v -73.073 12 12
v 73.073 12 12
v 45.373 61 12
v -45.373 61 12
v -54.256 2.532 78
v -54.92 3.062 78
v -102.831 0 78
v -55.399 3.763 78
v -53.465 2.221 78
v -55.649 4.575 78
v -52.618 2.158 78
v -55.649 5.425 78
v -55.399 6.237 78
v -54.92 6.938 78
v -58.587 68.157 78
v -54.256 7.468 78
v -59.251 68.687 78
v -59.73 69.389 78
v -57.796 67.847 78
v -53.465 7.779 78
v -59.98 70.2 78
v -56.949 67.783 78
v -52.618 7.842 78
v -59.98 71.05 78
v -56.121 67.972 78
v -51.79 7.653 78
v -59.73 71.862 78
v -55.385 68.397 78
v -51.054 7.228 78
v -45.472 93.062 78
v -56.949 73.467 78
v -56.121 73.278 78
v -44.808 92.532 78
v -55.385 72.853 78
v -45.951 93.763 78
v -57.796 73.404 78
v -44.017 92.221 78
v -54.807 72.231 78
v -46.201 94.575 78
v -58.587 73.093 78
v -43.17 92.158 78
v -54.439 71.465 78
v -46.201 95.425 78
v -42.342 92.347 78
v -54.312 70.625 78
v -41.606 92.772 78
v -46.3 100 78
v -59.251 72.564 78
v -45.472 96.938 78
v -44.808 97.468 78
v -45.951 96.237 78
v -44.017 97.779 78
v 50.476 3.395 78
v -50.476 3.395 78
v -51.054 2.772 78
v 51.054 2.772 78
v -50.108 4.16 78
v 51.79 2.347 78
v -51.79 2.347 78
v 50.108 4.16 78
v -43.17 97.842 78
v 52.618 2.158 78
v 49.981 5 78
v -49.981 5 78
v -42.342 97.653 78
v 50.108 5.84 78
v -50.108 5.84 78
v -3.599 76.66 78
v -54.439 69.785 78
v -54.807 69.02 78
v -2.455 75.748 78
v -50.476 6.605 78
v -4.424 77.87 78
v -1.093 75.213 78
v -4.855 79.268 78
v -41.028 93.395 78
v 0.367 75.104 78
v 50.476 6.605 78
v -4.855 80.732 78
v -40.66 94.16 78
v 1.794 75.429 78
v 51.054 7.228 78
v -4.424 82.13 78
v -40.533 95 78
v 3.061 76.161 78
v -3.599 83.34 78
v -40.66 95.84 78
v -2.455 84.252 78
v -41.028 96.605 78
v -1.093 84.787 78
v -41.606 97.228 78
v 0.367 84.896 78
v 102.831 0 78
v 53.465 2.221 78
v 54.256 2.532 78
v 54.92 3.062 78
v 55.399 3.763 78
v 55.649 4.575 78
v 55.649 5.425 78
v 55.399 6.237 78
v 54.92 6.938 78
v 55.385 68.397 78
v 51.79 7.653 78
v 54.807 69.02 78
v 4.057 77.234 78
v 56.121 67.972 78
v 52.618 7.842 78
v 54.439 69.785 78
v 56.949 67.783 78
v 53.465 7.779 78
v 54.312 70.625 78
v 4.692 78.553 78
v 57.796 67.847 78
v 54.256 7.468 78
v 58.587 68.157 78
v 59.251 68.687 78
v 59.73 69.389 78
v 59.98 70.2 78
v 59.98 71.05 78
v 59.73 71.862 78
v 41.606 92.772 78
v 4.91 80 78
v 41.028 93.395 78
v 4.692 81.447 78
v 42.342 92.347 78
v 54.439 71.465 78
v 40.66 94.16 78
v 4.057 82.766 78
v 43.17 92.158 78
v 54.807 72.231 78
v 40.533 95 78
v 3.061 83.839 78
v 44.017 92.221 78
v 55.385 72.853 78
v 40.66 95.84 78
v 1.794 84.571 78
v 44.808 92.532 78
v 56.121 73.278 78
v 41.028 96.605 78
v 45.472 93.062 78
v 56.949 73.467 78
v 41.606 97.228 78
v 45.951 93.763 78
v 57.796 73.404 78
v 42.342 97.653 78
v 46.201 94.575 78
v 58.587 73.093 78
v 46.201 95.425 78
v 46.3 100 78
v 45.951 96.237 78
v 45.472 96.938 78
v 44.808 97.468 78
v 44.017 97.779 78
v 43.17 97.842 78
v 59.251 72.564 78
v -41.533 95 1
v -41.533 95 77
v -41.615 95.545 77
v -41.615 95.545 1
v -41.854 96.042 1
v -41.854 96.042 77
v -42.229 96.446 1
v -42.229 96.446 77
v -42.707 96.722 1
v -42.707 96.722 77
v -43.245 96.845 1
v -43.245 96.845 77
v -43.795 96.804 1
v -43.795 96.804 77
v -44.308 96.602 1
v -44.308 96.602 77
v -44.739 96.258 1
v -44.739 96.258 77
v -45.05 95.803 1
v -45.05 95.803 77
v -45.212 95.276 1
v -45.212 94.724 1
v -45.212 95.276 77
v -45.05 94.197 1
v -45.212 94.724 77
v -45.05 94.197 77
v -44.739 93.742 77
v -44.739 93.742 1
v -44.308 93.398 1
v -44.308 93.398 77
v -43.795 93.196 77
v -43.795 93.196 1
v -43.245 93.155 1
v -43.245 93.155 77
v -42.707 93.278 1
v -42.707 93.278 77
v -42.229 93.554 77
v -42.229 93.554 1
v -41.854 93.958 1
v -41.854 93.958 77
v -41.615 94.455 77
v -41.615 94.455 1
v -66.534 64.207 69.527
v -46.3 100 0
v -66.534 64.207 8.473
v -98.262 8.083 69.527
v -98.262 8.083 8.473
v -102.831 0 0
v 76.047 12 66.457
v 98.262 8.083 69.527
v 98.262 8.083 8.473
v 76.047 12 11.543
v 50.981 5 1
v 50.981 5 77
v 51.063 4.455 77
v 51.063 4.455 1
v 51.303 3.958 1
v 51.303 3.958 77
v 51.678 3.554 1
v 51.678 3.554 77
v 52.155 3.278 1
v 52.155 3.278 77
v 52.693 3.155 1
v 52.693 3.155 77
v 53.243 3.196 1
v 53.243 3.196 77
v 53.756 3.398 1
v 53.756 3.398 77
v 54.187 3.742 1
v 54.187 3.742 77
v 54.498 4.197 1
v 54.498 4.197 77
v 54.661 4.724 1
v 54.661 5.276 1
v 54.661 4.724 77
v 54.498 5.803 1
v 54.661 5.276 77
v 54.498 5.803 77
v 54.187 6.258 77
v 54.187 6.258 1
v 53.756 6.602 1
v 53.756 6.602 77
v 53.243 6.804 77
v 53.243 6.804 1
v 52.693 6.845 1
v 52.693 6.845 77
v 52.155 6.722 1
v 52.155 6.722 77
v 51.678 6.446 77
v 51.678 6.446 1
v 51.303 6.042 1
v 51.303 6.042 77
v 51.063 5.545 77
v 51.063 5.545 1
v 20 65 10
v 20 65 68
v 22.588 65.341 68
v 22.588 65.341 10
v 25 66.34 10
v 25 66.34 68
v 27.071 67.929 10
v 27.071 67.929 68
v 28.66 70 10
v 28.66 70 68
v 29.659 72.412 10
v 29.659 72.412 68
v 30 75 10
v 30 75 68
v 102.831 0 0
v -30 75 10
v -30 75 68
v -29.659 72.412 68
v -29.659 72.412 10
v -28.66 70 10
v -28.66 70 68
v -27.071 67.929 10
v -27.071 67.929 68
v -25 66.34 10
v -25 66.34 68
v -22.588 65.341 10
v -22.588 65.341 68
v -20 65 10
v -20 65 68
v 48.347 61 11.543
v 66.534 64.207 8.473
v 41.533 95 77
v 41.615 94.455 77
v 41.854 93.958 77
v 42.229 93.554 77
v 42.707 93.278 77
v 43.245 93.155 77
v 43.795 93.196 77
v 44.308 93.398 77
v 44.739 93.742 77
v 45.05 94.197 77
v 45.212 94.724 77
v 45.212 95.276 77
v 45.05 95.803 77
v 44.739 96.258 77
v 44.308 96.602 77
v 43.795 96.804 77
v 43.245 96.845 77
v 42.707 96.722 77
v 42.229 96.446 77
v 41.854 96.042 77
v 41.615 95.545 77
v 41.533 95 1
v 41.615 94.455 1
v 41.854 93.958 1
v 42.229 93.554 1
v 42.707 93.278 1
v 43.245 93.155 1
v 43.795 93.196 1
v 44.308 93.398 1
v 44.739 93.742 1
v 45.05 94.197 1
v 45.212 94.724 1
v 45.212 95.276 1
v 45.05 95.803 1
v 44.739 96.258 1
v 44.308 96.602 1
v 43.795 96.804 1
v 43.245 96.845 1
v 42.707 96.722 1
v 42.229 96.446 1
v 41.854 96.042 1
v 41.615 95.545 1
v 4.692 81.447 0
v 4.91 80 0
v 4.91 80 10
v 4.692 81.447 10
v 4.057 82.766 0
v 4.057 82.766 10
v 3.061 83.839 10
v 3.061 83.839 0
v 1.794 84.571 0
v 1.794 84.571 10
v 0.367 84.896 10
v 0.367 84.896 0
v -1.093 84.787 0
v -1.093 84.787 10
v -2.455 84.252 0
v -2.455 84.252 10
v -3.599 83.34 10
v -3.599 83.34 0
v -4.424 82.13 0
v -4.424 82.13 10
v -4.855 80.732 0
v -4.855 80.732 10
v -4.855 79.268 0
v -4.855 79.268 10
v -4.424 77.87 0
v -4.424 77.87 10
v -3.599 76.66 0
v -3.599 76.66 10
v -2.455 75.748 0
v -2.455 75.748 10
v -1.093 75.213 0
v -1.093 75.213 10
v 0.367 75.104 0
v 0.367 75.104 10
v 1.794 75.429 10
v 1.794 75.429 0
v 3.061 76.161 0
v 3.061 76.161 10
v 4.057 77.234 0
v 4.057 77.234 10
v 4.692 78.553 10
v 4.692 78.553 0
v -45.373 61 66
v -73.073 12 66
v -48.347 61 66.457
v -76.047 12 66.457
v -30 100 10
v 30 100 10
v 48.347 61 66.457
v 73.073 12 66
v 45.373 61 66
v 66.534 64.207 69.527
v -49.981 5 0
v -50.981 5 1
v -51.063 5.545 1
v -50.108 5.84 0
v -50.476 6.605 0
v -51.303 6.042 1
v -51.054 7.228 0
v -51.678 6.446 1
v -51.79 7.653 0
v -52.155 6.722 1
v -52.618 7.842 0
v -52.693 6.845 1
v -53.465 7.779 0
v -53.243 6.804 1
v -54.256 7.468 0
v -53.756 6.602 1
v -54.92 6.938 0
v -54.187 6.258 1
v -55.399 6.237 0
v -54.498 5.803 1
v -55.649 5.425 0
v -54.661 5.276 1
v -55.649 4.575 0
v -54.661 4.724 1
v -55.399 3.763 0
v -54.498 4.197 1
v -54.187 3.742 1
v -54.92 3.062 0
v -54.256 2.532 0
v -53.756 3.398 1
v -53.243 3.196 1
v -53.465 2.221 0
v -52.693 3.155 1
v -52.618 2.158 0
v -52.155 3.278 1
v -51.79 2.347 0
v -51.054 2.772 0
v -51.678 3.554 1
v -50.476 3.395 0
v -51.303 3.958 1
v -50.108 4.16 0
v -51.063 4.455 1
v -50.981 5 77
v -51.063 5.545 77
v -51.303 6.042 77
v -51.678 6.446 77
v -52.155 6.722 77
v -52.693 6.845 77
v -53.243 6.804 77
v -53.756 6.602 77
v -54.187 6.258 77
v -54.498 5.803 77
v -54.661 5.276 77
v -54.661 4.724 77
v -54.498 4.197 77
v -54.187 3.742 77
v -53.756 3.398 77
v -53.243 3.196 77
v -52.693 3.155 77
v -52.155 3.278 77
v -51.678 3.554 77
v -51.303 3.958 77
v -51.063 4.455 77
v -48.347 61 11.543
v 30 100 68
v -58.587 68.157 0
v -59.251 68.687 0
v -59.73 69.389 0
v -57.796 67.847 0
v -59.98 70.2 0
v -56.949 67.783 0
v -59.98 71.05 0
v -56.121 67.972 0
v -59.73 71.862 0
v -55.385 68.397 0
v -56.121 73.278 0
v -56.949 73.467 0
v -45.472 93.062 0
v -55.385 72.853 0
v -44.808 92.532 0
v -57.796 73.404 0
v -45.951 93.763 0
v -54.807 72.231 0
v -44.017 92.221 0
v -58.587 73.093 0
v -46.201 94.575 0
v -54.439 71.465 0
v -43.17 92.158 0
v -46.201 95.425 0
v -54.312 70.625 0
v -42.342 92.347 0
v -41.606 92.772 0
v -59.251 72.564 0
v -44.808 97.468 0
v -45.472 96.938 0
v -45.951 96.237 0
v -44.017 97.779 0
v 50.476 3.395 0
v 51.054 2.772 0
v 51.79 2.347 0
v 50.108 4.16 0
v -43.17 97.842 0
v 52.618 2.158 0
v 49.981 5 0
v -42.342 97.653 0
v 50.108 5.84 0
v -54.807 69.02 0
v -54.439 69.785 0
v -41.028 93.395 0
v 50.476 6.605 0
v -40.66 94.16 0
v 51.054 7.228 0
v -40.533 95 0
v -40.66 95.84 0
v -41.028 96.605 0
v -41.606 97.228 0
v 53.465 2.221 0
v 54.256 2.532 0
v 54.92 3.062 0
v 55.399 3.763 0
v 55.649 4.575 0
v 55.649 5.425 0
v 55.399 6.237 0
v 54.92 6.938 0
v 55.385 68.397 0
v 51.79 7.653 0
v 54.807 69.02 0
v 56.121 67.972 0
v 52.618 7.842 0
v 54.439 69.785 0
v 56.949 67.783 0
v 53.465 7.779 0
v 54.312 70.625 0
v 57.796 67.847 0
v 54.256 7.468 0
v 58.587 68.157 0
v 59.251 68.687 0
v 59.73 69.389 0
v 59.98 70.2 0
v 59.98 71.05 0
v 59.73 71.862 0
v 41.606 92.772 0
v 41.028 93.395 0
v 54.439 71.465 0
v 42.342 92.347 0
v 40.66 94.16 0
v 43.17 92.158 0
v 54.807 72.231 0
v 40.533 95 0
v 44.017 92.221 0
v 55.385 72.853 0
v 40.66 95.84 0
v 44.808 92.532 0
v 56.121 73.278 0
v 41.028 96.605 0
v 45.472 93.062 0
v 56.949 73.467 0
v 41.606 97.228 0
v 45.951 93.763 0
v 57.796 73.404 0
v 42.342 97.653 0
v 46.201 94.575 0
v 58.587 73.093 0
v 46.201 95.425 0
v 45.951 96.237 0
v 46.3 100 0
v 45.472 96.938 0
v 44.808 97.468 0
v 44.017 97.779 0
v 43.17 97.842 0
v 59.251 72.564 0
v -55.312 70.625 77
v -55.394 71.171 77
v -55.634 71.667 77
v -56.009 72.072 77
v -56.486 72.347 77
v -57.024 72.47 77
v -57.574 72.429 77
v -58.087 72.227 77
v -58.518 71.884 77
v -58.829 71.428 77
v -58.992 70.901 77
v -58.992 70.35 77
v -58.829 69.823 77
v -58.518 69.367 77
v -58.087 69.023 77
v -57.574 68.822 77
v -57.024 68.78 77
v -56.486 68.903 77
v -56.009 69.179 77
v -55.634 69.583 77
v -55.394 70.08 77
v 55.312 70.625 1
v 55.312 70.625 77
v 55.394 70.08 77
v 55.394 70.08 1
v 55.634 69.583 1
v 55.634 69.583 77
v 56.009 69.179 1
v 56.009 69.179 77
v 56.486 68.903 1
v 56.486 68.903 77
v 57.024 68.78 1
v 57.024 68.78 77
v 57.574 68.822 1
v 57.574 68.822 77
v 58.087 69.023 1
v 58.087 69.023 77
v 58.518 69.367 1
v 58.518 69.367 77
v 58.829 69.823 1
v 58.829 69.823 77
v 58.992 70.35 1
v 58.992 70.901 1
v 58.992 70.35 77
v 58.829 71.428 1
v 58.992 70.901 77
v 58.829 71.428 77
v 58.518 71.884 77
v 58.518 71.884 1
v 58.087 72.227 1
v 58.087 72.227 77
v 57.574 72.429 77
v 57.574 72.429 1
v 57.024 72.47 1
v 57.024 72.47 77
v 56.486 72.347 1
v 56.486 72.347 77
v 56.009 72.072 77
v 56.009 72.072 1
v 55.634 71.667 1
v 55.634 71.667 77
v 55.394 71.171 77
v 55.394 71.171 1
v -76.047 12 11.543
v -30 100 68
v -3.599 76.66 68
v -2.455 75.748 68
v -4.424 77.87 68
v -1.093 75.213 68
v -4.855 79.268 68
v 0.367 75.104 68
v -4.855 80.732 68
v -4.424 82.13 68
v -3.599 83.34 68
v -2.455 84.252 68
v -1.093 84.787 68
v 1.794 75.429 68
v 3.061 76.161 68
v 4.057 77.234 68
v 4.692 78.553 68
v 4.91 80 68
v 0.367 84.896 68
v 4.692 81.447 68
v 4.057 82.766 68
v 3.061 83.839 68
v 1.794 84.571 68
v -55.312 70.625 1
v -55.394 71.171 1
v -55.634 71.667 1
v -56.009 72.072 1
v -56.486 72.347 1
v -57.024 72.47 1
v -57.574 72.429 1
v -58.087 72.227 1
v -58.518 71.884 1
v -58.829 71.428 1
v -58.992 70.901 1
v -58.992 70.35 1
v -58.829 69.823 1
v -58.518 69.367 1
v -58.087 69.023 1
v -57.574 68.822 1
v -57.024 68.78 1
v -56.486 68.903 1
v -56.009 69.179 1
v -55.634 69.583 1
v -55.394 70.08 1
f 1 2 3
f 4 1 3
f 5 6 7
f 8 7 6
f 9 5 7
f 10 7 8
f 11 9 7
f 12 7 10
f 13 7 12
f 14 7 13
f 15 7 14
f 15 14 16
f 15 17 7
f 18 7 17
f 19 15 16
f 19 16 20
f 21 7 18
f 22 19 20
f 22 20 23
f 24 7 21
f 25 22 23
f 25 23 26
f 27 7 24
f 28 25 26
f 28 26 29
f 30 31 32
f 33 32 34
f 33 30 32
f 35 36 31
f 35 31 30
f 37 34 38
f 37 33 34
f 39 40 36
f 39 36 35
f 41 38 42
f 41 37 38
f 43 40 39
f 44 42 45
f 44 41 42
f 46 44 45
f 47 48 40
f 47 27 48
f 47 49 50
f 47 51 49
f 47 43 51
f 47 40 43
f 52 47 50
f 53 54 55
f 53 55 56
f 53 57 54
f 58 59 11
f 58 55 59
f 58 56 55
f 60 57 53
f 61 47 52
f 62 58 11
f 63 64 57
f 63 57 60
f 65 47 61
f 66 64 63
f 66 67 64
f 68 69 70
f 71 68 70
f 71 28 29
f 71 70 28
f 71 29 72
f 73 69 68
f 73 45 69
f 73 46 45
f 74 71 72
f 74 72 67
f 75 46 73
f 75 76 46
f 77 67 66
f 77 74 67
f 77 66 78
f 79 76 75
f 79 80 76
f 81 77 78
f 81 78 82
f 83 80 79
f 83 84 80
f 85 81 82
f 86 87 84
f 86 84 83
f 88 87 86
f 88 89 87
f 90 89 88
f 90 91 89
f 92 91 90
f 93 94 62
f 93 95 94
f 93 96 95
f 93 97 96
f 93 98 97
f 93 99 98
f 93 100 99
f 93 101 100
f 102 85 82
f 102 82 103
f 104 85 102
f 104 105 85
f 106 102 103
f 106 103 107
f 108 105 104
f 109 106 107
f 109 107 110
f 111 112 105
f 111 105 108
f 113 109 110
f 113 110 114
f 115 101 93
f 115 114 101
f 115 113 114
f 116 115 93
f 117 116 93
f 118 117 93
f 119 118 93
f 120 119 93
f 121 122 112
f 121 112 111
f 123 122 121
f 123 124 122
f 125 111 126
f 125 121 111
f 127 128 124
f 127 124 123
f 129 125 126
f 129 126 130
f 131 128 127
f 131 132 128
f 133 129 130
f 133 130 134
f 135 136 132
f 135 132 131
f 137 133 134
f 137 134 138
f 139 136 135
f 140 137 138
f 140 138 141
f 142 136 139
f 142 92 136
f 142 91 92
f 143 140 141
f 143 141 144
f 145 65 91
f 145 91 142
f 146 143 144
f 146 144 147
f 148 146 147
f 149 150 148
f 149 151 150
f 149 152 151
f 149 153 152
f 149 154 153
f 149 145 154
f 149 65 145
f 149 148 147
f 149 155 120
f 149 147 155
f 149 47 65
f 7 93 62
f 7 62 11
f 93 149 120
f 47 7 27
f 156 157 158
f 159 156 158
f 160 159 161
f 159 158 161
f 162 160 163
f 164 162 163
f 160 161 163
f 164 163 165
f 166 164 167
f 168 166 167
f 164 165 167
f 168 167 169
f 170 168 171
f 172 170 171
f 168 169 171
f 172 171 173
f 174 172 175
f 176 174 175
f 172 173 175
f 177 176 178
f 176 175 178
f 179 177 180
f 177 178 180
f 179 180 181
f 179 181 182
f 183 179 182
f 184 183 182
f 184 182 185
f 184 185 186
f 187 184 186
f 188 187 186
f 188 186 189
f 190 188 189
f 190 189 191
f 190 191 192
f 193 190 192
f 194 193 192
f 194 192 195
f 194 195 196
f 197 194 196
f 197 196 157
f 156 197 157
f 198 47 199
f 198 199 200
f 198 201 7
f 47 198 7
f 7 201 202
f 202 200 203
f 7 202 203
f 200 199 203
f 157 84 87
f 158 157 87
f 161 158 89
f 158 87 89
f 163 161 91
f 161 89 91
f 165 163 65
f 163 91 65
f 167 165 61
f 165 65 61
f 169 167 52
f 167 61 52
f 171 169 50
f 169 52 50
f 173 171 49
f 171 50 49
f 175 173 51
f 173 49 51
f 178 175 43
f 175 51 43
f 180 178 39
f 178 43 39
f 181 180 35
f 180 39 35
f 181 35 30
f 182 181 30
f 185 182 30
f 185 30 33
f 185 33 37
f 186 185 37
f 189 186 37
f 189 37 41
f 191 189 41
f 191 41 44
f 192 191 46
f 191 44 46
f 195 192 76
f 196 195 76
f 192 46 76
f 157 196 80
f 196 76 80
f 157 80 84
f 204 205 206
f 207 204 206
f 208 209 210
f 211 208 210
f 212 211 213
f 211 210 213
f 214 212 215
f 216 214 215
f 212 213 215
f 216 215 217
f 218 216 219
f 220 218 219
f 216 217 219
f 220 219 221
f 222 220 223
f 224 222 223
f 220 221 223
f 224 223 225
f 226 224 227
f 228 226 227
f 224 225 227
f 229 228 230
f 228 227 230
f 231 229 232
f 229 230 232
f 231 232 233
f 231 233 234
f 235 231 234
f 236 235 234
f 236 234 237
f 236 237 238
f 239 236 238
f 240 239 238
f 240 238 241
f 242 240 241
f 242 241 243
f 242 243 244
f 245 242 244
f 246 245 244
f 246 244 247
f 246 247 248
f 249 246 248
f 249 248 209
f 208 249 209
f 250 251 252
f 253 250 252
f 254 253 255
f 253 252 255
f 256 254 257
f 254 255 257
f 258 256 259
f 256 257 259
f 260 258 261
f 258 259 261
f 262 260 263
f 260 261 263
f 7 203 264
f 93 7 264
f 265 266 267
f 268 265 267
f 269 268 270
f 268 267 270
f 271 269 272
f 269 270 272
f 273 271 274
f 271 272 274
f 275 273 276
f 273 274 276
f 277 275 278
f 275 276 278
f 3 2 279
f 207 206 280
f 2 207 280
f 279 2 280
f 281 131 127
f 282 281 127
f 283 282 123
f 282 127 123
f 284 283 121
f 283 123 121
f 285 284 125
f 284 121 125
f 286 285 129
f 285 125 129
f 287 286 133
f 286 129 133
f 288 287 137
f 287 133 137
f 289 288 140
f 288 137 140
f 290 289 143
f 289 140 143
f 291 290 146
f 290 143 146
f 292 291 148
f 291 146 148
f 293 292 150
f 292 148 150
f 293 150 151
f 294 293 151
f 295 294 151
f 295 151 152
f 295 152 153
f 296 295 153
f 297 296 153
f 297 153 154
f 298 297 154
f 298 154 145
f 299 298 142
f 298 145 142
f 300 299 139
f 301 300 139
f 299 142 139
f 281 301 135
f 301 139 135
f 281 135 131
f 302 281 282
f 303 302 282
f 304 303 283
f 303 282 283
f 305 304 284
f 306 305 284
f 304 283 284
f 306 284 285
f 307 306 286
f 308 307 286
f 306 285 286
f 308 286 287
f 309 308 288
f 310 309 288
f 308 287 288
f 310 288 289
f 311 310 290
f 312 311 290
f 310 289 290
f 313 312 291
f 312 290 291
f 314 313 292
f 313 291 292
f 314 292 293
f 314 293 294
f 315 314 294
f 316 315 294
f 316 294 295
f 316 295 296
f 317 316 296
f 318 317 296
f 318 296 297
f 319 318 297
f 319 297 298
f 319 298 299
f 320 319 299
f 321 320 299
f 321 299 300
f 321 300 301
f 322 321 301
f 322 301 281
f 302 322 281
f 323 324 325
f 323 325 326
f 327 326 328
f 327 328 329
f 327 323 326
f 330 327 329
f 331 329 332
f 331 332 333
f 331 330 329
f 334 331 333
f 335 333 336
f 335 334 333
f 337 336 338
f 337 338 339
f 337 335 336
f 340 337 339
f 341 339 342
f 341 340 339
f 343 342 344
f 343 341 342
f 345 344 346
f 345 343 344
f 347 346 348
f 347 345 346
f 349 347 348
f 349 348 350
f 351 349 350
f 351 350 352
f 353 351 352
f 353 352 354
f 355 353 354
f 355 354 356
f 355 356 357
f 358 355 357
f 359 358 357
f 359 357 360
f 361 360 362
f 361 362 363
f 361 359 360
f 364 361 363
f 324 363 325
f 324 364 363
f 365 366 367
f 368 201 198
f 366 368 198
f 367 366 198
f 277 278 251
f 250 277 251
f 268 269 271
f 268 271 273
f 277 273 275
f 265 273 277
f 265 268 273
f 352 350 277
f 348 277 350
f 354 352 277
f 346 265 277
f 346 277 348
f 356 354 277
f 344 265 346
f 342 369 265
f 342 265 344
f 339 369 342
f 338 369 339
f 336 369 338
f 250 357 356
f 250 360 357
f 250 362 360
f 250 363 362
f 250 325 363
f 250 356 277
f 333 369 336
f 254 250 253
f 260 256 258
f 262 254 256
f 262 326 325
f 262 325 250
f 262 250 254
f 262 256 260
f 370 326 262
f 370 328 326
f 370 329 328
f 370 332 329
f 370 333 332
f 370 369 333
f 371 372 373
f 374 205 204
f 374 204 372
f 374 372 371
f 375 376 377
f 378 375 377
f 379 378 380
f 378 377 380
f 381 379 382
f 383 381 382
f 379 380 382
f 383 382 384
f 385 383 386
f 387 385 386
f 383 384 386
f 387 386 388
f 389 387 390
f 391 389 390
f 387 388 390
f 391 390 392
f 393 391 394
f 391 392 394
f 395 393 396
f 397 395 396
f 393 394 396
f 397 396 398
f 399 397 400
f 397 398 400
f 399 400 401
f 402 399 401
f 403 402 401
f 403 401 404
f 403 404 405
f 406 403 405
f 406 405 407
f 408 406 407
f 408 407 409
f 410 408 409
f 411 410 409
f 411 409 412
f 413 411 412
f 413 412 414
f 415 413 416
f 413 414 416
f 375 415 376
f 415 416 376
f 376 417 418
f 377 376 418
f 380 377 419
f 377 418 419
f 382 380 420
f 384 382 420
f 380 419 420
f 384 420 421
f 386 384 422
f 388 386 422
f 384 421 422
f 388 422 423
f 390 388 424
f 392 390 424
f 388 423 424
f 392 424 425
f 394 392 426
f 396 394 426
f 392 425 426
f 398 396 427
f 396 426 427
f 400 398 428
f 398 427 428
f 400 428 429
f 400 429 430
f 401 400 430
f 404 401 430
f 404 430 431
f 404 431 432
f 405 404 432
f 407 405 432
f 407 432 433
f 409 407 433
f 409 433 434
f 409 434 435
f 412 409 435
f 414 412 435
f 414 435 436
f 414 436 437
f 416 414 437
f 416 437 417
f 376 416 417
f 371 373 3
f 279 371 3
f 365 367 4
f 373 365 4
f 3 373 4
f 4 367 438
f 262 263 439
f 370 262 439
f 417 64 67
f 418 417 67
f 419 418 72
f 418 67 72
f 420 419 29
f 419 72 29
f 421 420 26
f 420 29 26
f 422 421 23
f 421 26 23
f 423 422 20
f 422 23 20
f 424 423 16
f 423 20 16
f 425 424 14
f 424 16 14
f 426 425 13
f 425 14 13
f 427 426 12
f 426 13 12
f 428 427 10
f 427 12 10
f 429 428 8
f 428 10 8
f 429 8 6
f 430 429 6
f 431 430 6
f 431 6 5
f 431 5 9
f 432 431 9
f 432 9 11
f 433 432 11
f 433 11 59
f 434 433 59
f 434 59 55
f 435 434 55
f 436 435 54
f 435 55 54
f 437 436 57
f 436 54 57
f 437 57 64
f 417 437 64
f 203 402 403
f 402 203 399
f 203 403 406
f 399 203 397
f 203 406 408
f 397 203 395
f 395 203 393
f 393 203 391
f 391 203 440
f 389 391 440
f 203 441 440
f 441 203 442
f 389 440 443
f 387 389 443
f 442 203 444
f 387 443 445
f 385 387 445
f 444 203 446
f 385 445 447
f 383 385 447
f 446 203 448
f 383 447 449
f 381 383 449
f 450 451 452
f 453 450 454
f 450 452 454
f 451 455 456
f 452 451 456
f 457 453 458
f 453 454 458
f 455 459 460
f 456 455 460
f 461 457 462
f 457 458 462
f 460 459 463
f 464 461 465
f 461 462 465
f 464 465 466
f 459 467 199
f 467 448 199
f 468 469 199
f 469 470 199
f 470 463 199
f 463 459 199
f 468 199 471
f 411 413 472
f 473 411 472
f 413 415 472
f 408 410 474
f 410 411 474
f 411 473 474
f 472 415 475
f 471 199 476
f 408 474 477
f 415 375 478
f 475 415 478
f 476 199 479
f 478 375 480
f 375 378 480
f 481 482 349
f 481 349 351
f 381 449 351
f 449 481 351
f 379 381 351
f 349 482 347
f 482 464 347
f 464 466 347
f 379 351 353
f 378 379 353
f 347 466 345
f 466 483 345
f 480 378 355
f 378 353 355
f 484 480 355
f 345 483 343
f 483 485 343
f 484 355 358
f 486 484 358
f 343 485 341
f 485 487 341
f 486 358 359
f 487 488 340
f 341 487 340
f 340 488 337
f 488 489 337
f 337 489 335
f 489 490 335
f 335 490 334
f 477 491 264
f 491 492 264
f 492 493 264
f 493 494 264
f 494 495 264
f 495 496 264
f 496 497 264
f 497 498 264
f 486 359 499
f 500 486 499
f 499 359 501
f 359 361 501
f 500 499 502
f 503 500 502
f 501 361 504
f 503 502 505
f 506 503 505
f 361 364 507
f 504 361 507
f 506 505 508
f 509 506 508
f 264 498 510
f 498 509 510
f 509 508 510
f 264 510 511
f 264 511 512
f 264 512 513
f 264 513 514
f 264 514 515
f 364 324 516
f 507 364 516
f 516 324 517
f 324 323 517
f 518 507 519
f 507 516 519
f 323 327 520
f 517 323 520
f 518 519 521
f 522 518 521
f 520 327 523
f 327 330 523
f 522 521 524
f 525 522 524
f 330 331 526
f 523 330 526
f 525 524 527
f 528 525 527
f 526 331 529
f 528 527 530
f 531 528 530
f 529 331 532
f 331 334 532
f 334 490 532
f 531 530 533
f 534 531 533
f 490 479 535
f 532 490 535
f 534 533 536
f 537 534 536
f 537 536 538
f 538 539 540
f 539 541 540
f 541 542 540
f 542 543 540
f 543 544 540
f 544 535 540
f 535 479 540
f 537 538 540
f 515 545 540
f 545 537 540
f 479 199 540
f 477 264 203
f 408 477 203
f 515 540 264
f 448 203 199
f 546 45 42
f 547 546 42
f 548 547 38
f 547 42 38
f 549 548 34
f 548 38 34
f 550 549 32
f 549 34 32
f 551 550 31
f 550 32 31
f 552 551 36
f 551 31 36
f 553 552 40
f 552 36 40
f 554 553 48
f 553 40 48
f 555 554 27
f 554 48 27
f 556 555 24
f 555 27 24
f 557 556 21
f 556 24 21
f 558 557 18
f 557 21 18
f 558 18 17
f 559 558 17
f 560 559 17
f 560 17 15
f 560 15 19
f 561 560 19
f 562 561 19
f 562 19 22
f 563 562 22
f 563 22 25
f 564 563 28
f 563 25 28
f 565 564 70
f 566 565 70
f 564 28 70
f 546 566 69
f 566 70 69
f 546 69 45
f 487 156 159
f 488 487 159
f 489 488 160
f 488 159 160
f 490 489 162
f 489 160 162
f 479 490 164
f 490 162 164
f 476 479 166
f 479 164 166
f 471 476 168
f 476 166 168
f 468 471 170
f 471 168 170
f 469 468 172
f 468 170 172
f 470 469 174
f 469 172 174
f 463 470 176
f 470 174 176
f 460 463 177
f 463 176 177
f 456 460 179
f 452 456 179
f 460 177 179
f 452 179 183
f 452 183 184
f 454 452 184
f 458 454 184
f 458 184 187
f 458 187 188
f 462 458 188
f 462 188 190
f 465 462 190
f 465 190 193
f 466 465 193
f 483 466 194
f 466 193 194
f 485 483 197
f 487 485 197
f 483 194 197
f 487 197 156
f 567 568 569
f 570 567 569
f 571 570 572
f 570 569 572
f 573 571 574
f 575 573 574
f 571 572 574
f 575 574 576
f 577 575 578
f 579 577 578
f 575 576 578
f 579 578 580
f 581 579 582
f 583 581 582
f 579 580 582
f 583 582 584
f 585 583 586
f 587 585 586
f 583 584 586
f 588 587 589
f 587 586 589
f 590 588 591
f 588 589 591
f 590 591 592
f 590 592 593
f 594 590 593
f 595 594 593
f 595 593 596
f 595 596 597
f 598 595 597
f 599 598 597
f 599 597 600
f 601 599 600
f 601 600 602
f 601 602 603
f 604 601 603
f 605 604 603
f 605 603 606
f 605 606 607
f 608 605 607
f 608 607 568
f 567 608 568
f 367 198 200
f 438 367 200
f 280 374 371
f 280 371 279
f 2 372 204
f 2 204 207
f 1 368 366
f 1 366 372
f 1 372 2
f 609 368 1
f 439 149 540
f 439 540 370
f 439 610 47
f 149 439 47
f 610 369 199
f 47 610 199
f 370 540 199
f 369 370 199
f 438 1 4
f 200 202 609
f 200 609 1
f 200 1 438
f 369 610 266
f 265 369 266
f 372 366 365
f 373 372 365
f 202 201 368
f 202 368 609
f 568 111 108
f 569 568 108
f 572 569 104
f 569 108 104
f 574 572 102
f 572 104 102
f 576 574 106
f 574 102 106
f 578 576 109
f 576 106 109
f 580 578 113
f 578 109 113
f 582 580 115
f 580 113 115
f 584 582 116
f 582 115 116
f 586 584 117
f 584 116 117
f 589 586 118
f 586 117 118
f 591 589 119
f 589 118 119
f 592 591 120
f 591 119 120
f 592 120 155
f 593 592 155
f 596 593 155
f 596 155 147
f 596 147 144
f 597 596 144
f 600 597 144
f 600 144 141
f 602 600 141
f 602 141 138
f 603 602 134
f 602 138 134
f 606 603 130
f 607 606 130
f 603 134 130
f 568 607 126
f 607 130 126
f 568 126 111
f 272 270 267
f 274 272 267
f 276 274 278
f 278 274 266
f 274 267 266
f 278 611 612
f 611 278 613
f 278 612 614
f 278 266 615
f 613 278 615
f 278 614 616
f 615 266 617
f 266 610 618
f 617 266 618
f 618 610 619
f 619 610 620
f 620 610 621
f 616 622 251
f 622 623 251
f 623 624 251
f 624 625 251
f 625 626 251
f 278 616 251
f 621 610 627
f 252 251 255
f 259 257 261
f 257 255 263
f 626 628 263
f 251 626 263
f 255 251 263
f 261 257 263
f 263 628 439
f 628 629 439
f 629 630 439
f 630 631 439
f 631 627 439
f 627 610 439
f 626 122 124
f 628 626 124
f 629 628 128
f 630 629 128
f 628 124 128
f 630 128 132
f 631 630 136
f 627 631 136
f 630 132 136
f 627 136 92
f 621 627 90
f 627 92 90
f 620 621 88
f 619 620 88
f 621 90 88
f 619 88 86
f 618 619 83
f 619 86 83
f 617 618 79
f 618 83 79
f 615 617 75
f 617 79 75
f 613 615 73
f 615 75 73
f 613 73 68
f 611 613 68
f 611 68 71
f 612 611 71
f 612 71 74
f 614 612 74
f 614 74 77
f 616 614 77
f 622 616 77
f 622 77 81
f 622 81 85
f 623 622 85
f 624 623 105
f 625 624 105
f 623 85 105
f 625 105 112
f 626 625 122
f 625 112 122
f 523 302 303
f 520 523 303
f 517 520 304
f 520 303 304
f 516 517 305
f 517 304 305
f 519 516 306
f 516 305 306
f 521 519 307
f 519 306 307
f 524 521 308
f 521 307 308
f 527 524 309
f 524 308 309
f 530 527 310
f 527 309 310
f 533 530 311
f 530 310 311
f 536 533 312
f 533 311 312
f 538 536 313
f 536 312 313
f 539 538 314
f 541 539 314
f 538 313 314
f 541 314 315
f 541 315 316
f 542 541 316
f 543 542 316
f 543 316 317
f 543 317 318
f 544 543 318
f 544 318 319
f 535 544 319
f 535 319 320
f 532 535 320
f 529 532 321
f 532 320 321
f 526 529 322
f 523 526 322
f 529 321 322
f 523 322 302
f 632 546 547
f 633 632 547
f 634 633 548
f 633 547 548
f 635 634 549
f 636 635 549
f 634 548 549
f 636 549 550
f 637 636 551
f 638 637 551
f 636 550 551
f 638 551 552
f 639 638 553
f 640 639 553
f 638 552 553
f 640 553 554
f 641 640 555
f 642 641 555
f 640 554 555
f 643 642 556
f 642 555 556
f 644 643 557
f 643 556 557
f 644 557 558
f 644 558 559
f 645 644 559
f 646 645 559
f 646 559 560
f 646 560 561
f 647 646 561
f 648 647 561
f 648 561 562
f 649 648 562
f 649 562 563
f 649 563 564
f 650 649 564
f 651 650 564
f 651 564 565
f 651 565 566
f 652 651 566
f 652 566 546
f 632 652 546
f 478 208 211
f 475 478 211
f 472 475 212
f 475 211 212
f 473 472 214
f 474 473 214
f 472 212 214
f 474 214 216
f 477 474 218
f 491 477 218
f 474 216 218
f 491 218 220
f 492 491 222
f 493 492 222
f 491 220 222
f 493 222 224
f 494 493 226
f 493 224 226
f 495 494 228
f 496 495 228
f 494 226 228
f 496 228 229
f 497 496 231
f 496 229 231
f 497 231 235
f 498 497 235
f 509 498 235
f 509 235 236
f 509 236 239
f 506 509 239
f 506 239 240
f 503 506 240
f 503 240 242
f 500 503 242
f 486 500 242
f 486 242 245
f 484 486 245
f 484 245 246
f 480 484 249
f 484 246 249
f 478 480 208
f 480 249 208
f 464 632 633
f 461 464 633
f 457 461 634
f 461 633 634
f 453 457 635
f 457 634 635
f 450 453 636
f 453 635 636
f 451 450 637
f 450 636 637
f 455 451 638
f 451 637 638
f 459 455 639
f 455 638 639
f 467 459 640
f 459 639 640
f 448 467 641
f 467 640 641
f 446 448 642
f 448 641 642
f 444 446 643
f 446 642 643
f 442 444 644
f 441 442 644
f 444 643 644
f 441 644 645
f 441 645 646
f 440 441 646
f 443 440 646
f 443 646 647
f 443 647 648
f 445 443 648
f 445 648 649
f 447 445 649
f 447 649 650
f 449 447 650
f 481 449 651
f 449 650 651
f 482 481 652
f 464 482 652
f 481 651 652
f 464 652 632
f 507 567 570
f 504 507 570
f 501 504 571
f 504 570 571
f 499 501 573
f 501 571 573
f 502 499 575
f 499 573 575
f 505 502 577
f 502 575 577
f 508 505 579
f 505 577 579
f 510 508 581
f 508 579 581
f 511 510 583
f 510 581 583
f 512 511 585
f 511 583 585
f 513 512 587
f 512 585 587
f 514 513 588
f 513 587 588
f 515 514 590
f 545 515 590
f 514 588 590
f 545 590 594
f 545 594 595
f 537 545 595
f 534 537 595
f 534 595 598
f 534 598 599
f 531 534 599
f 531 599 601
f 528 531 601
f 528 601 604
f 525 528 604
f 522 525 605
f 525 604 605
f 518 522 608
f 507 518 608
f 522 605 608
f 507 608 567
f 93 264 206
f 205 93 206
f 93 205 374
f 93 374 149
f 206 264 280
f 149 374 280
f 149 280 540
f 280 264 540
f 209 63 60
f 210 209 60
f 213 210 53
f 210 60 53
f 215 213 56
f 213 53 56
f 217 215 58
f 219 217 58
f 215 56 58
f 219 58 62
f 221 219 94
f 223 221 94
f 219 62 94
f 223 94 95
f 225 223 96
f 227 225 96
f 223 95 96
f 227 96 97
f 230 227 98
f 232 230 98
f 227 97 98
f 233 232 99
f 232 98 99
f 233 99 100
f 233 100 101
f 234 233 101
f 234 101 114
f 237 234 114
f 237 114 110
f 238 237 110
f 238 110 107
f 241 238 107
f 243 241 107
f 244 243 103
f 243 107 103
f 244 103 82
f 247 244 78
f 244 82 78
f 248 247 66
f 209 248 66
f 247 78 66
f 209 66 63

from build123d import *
from OCP.BRepFilletAPI import BRepFilletAPI_MakeChamfer

# Parameters (mm, degrees)
BOSS_EXTRUDE1_DEPTH     = 78
SKETCH3_W               = 54
SKETCH3_H               = 49
CUT_EXTRUDE1_DEPTH      = 164.27356518
CUT_EXTRUDE1_DEPTH_BACK = 164.27356518
CHAMFER1_SIZE           = 20
CHAMFER1_SIZE2          = 4.499551712
CHAMFER1_SIZE2_2        = 3.526539614
CHAMFER1_SIZE2_3        = 3.683833732
CUT_EXTRUDE2_DEPTH      = 164.27356518
SKETCH8_W               = 60
SKETCH8_H               = 46.143990022
SKETCH8_R               = 4.91
BOSS_EXTRUDE4_DEPTH     = 10
BOSS_EXTRUDE5_START     = -78
SKETCH8_3_W             = 60
SKETCH8_3_H             = 46.143990022
SKETCH8_3_R             = 4.91
BOSS_EXTRUDE5_DEPTH     = 10
SKETCH10_R              = 1.85
CUT_EXTRUDE4_DEPTH      = 164.27356518
CHAMFER2_SIZE           = 1


with BuildPart() as part:
    # Sketch2 → Boss-Extrude1 (new body)
    with BuildSketch(Plane.XY):
        Polygon((46.3, 100), (-46.3, 100), (-102.831206773, 0), (102.831206773, 0), align=None)
    extrude(amount=BOSS_EXTRUDE1_DEPTH)

    # Sketch3 → Cut-Extrude1 (cut, two sides)
    with BuildSketch(Plane(origin=(0, 0, 0), x_dir=(0, 0, -1), z_dir=(1, 0, 0))) as cut_extrude1_sk:
        with Locations((-39, 36.5)):
            Rectangle(SKETCH3_W, SKETCH3_H)
    extrude(amount=CUT_EXTRUDE1_DEPTH, mode=Mode.SUBTRACT)
    extrude(cut_extrude1_sk.sketch, amount=-CUT_EXTRUDE1_DEPTH_BACK, mode=Mode.SUBTRACT)

    # Chamfer1: one chamfer whose edges measure the first distance from different faces: ONE call of the kernel's chamfer builder (chamfer() names one face for all edges)
    chamfer1_edges_1 = [part.edges().sort_by_distance(p)[0] for p in [
        (96.04746196, 12, 39),
        (-96.04746196, 12, 39),
    ]]
    chamfer1_side_1 = [part.faces().sort_by_distance(p)[0] for p in [
        (0, 12, 39),
    ]]
    chamfer1_edges_2 = [part.edges().sort_by_distance(p)[0] for p in [
        (82.197316301, 36.5, 12),
        (-82.197316301, 36.5, 12),
    ]]
    chamfer1_side_2 = [part.faces().sort_by_distance(p)[0] for p in [
        (0, 35.123926814, 12),
    ]]
    chamfer1_edges_3 = [part.edges().sort_by_distance(p)[0] for p in [
        (68.347170642, 61, 39),
        (-68.347170642, 61, 39),
    ]]
    chamfer1_side_3 = [part.faces().sort_by_distance(p)[0] for p in [
        (0, 61, 39),
    ]]
    chamfer1_edges_4 = [part.edges().sort_by_distance(p)[0] for p in [
        (82.197316301, 36.5, 66),
        (-82.197316301, 36.5, 66),
    ]]
    chamfer1_side_4 = [part.faces().sort_by_distance(p)[0] for p in [
        (0, 35.123926814, 66),
    ]]
    chamfer1 = BRepFilletAPI_MakeChamfer(part.part.solid().wrapped)
    for e in chamfer1_edges_1:
        chamfer1.Add(CHAMFER1_SIZE, CHAMFER1_SIZE2, e.wrapped, chamfer1_side_1[0].wrapped)  # the first distance lies on this face
    for e in chamfer1_edges_2:
        chamfer1.Add(CHAMFER1_SIZE, CHAMFER1_SIZE2_2, e.wrapped, chamfer1_side_2[0].wrapped)  # the first distance lies on this face
    for e in chamfer1_edges_3:
        chamfer1.Add(CHAMFER1_SIZE, CHAMFER1_SIZE2_3, e.wrapped, chamfer1_side_3[0].wrapped)  # the first distance lies on this face
    for e in chamfer1_edges_4:
        chamfer1.Add(CHAMFER1_SIZE, CHAMFER1_SIZE2_2, e.wrapped, chamfer1_side_4[0].wrapped)  # the first distance lies on this face
    add(Compound.cast(chamfer1.Shape()), mode=Mode.REPLACE)

    # Sketch4 → Cut-Extrude2 (cut, through all)
    with BuildSketch(Plane.XY.offset(78)):
        with BuildLine():
            Line((-20, 65), (20, 65))
            ThreePointArc((20, 65), (27.071067812, 67.928932188), (30, 75))
            Line((30, 75), (30, 100))
            Line((30, 100), (-30, 100))
            Line((-30, 100), (-30, 75))
            ThreePointArc((-30, 75), (-27.071067812, 67.928932188), (-20, 65))
        make_face()
    extrude(amount=-CUT_EXTRUDE2_DEPTH, mode=Mode.SUBTRACT)

    # Sketch8 → Boss-Extrude4 (add)
    with BuildSketch(Plane.XY.offset(78)):
        with Locations((0, 76.928004989)):
            Rectangle(SKETCH8_W, SKETCH8_H)
        with Locations((0, 80)):
            Circle(SKETCH8_R, mode=Mode.SUBTRACT)
    extrude(amount=-BOSS_EXTRUDE4_DEPTH)

    # Sketch8<3> → Boss-Extrude5 (add)
    with BuildSketch(Plane.XY.offset(78).offset(BOSS_EXTRUDE5_START)):
        with Locations((0, 76.928004989)):
            Rectangle(SKETCH8_3_W, SKETCH8_3_H)
        with Locations((0, 80)):
            Circle(SKETCH8_3_R, mode=Mode.SUBTRACT)
    extrude(amount=BOSS_EXTRUDE5_DEPTH)

    # Sketch10 → Cut-Extrude4 (cut, through all)
    with BuildSketch(Plane.XY.offset(78)):
        with Locations((-43.382916604, 95)):
            Circle(SKETCH10_R)
        with Locations((-57.162268727, 70.625229128)):
            Circle(SKETCH10_R)
        with Locations((-52.831206773, 5)):
            Circle(SKETCH10_R)
        with Locations(Location((52.831206773, 5, 0), (0, 0, 180))):
            Circle(SKETCH10_R)
        with Locations(Location((57.162268727, 70.625229128, 0), (0, 0, 180))):
            Circle(SKETCH10_R)
        with Locations(Location((43.382916604, 95, 0), (0, 0, 180))):
            Circle(SKETCH10_R)
    extrude(amount=-CUT_EXTRUDE4_DEPTH, mode=Mode.SUBTRACT)

    # Chamfer2
    chamfer2_edges = [part.edges().sort_by_distance(p)[0] for p in [
        (45.232916604, 95, 0),
        (45.232916604, 95, 78),
        (59.012268727, 70.625229128, 0),
        (59.012268727, 70.625229128, 78),
        (54.681206773, 5, 0),
        (54.681206773, 5, 78),
        (-54.681206773, 5, 0),
        (-54.681206773, 5, 78),
        (-59.012268727, 70.625229128, 0),
        (-59.012268727, 70.625229128, 78),
        (-45.232916604, 95, 0),
        (-45.232916604, 95, 78),
    ]]
    chamfer(chamfer2_edges, length=CHAMFER2_SIZE)


solid = part.part
